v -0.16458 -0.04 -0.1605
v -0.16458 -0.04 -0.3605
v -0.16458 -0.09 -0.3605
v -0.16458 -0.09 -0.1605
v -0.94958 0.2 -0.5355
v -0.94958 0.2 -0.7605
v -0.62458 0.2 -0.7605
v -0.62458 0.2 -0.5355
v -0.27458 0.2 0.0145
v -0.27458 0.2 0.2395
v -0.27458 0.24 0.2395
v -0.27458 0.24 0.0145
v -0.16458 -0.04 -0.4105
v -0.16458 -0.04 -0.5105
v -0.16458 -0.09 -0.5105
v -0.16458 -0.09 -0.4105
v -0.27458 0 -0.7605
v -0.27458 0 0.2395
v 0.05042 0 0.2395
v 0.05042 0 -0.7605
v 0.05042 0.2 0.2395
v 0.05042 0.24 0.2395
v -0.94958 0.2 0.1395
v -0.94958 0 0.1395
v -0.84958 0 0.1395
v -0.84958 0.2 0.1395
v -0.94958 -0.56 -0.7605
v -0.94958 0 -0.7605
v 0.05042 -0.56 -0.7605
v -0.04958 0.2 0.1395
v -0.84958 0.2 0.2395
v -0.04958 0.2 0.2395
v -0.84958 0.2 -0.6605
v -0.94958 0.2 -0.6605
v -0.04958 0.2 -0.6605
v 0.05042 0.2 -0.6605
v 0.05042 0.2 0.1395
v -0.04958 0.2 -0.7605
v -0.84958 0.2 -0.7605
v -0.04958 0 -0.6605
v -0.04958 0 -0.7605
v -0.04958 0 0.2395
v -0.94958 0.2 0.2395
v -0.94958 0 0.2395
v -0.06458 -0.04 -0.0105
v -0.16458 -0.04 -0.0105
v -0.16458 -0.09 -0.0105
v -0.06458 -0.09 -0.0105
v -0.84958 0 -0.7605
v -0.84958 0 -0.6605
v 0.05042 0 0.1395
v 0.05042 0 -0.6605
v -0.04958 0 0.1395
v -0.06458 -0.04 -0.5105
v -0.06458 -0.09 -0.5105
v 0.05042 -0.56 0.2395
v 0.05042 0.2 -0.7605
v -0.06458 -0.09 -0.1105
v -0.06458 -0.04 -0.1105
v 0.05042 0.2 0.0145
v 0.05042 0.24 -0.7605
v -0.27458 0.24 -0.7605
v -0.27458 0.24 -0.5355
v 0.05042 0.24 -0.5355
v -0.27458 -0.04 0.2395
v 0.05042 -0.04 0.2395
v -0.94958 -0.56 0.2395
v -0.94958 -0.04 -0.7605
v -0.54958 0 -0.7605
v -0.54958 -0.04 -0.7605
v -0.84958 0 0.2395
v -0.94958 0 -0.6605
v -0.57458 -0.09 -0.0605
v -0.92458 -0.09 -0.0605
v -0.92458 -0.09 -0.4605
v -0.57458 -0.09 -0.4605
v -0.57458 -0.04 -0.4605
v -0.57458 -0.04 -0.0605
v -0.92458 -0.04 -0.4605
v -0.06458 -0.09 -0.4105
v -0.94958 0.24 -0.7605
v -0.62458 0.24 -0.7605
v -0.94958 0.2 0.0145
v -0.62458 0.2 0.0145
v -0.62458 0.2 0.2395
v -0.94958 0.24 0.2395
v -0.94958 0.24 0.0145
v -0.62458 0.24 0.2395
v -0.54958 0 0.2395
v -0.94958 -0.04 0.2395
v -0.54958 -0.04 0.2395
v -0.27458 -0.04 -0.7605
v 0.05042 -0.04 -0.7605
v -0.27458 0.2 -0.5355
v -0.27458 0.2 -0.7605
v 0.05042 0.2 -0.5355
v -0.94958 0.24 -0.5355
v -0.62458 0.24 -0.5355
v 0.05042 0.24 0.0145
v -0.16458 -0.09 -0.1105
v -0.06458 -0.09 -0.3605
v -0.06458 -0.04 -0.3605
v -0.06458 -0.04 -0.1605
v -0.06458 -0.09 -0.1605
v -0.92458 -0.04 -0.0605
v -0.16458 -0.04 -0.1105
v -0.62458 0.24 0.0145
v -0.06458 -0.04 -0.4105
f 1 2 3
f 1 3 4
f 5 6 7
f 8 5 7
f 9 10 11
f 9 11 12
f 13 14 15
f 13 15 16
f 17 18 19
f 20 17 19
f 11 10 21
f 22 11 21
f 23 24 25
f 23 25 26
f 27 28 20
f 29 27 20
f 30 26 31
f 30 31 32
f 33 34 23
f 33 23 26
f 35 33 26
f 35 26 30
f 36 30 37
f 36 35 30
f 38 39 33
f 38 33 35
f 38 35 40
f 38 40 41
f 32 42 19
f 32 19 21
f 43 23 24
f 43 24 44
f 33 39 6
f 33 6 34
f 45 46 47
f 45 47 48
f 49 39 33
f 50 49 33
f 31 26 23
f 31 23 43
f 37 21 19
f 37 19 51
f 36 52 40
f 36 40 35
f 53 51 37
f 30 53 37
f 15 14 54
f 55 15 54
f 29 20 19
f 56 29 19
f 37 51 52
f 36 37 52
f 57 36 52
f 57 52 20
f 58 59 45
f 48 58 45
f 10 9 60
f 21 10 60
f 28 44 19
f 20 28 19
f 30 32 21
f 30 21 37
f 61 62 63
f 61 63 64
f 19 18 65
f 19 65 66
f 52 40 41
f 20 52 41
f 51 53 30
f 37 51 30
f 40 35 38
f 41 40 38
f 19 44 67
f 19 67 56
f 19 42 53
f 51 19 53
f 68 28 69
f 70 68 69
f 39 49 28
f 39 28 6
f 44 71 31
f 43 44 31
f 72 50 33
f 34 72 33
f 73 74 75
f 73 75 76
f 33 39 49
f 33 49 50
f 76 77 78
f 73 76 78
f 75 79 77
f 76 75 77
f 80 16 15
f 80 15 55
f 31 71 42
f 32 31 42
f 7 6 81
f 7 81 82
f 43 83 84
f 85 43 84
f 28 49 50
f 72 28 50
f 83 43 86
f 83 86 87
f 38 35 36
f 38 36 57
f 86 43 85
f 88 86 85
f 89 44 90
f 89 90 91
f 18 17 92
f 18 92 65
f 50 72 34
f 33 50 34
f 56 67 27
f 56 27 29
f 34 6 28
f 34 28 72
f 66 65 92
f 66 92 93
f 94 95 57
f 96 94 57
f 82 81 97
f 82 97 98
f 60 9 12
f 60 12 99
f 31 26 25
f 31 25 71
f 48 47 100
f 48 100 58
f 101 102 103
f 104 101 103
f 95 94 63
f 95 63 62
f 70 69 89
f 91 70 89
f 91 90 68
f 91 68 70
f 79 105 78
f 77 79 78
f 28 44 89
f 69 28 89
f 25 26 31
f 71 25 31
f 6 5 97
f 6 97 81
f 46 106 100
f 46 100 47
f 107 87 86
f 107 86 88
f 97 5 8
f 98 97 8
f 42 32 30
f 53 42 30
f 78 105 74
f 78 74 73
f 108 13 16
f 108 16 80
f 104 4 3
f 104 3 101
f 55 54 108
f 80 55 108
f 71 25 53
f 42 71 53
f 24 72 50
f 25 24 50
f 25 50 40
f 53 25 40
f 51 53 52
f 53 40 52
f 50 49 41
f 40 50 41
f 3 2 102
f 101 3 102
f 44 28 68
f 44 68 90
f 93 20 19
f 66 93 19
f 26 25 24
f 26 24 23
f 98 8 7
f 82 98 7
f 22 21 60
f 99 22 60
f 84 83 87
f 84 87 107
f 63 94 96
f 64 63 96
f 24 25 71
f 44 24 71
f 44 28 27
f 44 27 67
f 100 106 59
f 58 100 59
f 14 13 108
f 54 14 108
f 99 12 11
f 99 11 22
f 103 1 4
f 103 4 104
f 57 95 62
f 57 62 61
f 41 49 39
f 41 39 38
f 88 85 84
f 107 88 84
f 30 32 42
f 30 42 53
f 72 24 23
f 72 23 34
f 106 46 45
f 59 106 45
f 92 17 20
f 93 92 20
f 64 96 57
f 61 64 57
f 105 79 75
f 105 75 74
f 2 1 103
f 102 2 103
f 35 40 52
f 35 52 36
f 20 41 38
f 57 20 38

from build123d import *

# Parameters (mm, degrees)
SKETCH_1_W          = 1
SKETCH_1_H          = 1
EXTRUDE_1_DEPTH     = 0.2
SKETCH_3_W          = 0.325
SKETCH_3_H          = 0.225
EXTRUDE_2_DEPTH     = 0.04
EXTRUDE_2_2_DEPTH   = 0.04
EXTRUDE_2_3_DEPTH   = 0.04
EXTRUDE_2_4_DEPTH   = 0.04
SKETCH_4_W          = 0.4
SKETCH_4_H          = 1
EXTRUDE_3_DEPTH     = 0.04
SKETCH_4_W_2        = 0.325
EXTRUDE_3_2_DEPTH   = 0.04
SKETCH_5_W          = 0.35
SKETCH_5_H          = 0.4
EXTRUDE_4_DEPTH     = 0.05
SKETCH_7_W          = 0.1
SKETCH_7_H          = 0.1
EXTRUDE_5_DEPTH     = 0.05
EXTRUDE_5_2_DEPTH   = 0.05
SKETCH_7_H_2        = 0.2
EXTRUDE_5_3_DEPTH   = 0.05
SKETCH_8_W          = 1
SKETCH_8_H          = 1
EXTRUDE_6_DEPTH     = 0.56
SKETCH_12_W         = 0.1
SKETCH_12_H         = 0.2
CUT_EXTRUDE_1_DEPTH = 0.1
SKETCH_11_W         = 0.1
SKETCH_11_H         = 0.2
CUT_EXTRUDE_2_DEPTH = 0.1
SKETCH_16_W         = 0.1
SKETCH_16_H         = 0.2
CUT_EXTRUDE_3_DEPTH = 0.1
SKETCH_18_W         = 0.1
SKETCH_18_H         = 0.2
EXTRUDE_7_DEPTH     = 0.1
SKETCH_19_W         = 0.1
SKETCH_19_H         = 0.2
EXTRUDE_8_DEPTH     = 0.1
SKETCH_20_W         = 0.1
SKETCH_20_H         = 0.2
EXTRUDE_9_DEPTH     = 0.1
SKETCH_21_W         = 0.1
SKETCH_21_H         = 0.2
EXTRUDE_10_DEPTH    = 0.1


with BuildPart() as part:
    # 草图1 → 凸台-拉伸1 (new body)
    with BuildSketch(Plane(origin=(0, 0, 0), x_dir=(1, 0, 0), z_dir=(0, 1, 0))):
        with Locations((-0.449579832, 0.260504202)):
            Rectangle(SKETCH_1_W, SKETCH_1_H)
    extrude(amount=EXTRUDE_1_DEPTH)

    # 草图12 → 切除-拉伸1 (cut)
    with BuildSketch(Plane.ZY.offset(0.949579832)):
        with Locations((0.189495798, 0.1)):
            Rectangle(SKETCH_12_W, SKETCH_12_H)
    extrude(amount=-CUT_EXTRUDE_1_DEPTH, mode=Mode.SUBTRACT)

    # 草图11 → 切除-拉伸2 (cut)
    with BuildSketch(Plane.ZY.offset(0.949579832)):
        with Locations((-0.710504202, 0.1)):
            Rectangle(SKETCH_11_W, SKETCH_11_H)
    extrude(amount=-CUT_EXTRUDE_2_DEPTH, mode=Mode.SUBTRACT)

    # 草图16 → 切除-拉伸3 (cut)
    with BuildSketch(Plane(origin=(0.050420168, 0, 0), x_dir=(0, 0, -1), z_dir=(1, 0, 0))):
        with Locations((-0.189495798, 0.1)):
            Rectangle(SKETCH_16_W, SKETCH_16_H)
        with Locations((0.710504202, 0.1)):
            Rectangle(SKETCH_16_W, SKETCH_16_H)
    extrude(amount=-CUT_EXTRUDE_3_DEPTH, mode=Mode.SUBTRACT)


with BuildPart() as body_2:
    # 草图3 → 凸台-拉伸2 (new body)
    with BuildSketch(Plane(origin=(0, 0.2, 0), x_dir=(1, 0, 0), z_dir=(0, 1, 0))):
        with Locations((-0.787079832, 0.648004202)):
            Rectangle(SKETCH_3_W, SKETCH_3_H)
    extrude(amount=EXTRUDE_2_DEPTH)


with BuildPart() as body_3:
    # 草图3 → Extrude 2 2 (new body)
    with BuildSketch(Plane(origin=(0, 0.2, 0), x_dir=(1, 0, 0), z_dir=(0, 1, 0))):
        with Locations((-0.112079832, 0.648004202)):
            Rectangle(SKETCH_3_W, SKETCH_3_H)
    extrude(amount=EXTRUDE_2_2_DEPTH)


with BuildPart() as body_4:
    # 草图3 → Extrude 2 3 (new body)
    with BuildSketch(Plane(origin=(0, 0.2, 0), x_dir=(1, 0, 0), z_dir=(0, 1, 0))):
        with Locations((-0.787079832, -0.126995798)):
            Rectangle(SKETCH_3_W, SKETCH_3_H)
    extrude(amount=EXTRUDE_2_3_DEPTH)


with BuildPart() as body_5:
    # 草图3 → Extrude 2 4 (new body)
    with BuildSketch(Plane(origin=(0, 0.2, 0), x_dir=(1, 0, 0), z_dir=(0, 1, 0))):
        with Locations((-0.112079832, -0.126995798)):
            Rectangle(SKETCH_3_W, SKETCH_3_H)
    extrude(amount=EXTRUDE_2_4_DEPTH)


with BuildPart() as body_6:
    # 草图4 → 凸台-拉伸3 (new body)
    with BuildSketch(Plane.XZ):
        with Locations((-0.749579832, -0.260504202)):
            Rectangle(SKETCH_4_W, SKETCH_4_H)
    extrude(amount=EXTRUDE_3_DEPTH)


with BuildPart() as body_7:
    # 草图4 → Extrude 3 2 (new body)
    with BuildSketch(Plane.XZ):
        with Locations((-0.112079832, -0.260504202)):
            Rectangle(SKETCH_4_W_2, SKETCH_4_H)
    extrude(amount=EXTRUDE_3_2_DEPTH)


with BuildPart() as body_8:
    # 草图5 → 凸台-拉伸4 (new body)
    with BuildSketch(Plane.XZ.offset(0.04)):
        with Locations((-0.749579832, -0.260504202)):
            Rectangle(SKETCH_5_W, SKETCH_5_H)
    extrude(amount=EXTRUDE_4_DEPTH)


with BuildPart() as body_9:
    # 草图7 → 凸台-拉伸5 (new body)
    with BuildSketch(Plane.XZ.offset(0.04)):
        with Locations((-0.114579832, -0.060504202)):
            Rectangle(SKETCH_7_W, SKETCH_7_H)
    extrude(amount=EXTRUDE_5_DEPTH)


with BuildPart() as body_10:
    # 草图7 → Extrude 5 2 (new body)
    with BuildSketch(Plane.XZ.offset(0.04)):
        with Locations((-0.114579832, -0.460504202)):
            Rectangle(SKETCH_7_W, SKETCH_7_H)
    extrude(amount=EXTRUDE_5_2_DEPTH)


with BuildPart() as body_11:
    # 草图7 → Extrude 5 3 (new body)
    with BuildSketch(Plane.XZ.offset(0.04)):
        with Locations((-0.114579832, -0.260504202)):
            Rectangle(SKETCH_7_W, SKETCH_7_H_2)
    extrude(amount=EXTRUDE_5_3_DEPTH)


with BuildPart() as body_12:
    # 草图8 → 凸台-拉伸6 (new body)
    with BuildSketch(Plane.XZ):
        with Locations((-0.449579832, -0.260504202)):
            Rectangle(SKETCH_8_W, SKETCH_8_H)
    extrude(amount=EXTRUDE_6_DEPTH)


with BuildPart() as body_13:
    # 草图18 → 凸台-拉伸7 (new body)
    with BuildSketch(Plane(origin=(-0.049579832, 0, 0), x_dir=(0, 0, -1), z_dir=(1, 0, 0))):
        with Locations((-0.189495798, 0.1)):
            Rectangle(SKETCH_18_W, SKETCH_18_H)
    extrude(amount=EXTRUDE_7_DEPTH)


with BuildPart() as body_14:
    # 草图19 → 凸台-拉伸8 (new body)
    with BuildSketch(Plane(origin=(-0.049579832, 0, 0), x_dir=(0, 0, -1), z_dir=(1, 0, 0))):
        with Locations((0.710504202, 0.1)):
            Rectangle(SKETCH_19_W, SKETCH_19_H)
    extrude(amount=EXTRUDE_8_DEPTH)


with BuildPart() as body_15:
    # 草图20 → 凸台-拉伸9 (new body)
    with BuildSketch(Plane.ZY.offset(0.849579832)):
        with Locations((0.189495798, 0.1)):
            Rectangle(SKETCH_20_W, SKETCH_20_H)
    extrude(amount=EXTRUDE_9_DEPTH)


with BuildPart() as body_16:
    # 草图21 → 凸台-拉伸10 (new body)
    with BuildSketch(Plane.ZY.offset(0.849579832)):
        with Locations((-0.710504202, 0.1)):
            Rectangle(SKETCH_21_W, SKETCH_21_H)
    extrude(amount=EXTRUDE_10_DEPTH)


solid = Compound([part.part, body_2.part, body_3.part, body_4.part, body_5.part, body_6.part, body_7.part, body_8.part, body_9.part, body_10.part, body_11.part, body_12.part, body_13.part, body_14.part, body_15.part, body_16.part])
